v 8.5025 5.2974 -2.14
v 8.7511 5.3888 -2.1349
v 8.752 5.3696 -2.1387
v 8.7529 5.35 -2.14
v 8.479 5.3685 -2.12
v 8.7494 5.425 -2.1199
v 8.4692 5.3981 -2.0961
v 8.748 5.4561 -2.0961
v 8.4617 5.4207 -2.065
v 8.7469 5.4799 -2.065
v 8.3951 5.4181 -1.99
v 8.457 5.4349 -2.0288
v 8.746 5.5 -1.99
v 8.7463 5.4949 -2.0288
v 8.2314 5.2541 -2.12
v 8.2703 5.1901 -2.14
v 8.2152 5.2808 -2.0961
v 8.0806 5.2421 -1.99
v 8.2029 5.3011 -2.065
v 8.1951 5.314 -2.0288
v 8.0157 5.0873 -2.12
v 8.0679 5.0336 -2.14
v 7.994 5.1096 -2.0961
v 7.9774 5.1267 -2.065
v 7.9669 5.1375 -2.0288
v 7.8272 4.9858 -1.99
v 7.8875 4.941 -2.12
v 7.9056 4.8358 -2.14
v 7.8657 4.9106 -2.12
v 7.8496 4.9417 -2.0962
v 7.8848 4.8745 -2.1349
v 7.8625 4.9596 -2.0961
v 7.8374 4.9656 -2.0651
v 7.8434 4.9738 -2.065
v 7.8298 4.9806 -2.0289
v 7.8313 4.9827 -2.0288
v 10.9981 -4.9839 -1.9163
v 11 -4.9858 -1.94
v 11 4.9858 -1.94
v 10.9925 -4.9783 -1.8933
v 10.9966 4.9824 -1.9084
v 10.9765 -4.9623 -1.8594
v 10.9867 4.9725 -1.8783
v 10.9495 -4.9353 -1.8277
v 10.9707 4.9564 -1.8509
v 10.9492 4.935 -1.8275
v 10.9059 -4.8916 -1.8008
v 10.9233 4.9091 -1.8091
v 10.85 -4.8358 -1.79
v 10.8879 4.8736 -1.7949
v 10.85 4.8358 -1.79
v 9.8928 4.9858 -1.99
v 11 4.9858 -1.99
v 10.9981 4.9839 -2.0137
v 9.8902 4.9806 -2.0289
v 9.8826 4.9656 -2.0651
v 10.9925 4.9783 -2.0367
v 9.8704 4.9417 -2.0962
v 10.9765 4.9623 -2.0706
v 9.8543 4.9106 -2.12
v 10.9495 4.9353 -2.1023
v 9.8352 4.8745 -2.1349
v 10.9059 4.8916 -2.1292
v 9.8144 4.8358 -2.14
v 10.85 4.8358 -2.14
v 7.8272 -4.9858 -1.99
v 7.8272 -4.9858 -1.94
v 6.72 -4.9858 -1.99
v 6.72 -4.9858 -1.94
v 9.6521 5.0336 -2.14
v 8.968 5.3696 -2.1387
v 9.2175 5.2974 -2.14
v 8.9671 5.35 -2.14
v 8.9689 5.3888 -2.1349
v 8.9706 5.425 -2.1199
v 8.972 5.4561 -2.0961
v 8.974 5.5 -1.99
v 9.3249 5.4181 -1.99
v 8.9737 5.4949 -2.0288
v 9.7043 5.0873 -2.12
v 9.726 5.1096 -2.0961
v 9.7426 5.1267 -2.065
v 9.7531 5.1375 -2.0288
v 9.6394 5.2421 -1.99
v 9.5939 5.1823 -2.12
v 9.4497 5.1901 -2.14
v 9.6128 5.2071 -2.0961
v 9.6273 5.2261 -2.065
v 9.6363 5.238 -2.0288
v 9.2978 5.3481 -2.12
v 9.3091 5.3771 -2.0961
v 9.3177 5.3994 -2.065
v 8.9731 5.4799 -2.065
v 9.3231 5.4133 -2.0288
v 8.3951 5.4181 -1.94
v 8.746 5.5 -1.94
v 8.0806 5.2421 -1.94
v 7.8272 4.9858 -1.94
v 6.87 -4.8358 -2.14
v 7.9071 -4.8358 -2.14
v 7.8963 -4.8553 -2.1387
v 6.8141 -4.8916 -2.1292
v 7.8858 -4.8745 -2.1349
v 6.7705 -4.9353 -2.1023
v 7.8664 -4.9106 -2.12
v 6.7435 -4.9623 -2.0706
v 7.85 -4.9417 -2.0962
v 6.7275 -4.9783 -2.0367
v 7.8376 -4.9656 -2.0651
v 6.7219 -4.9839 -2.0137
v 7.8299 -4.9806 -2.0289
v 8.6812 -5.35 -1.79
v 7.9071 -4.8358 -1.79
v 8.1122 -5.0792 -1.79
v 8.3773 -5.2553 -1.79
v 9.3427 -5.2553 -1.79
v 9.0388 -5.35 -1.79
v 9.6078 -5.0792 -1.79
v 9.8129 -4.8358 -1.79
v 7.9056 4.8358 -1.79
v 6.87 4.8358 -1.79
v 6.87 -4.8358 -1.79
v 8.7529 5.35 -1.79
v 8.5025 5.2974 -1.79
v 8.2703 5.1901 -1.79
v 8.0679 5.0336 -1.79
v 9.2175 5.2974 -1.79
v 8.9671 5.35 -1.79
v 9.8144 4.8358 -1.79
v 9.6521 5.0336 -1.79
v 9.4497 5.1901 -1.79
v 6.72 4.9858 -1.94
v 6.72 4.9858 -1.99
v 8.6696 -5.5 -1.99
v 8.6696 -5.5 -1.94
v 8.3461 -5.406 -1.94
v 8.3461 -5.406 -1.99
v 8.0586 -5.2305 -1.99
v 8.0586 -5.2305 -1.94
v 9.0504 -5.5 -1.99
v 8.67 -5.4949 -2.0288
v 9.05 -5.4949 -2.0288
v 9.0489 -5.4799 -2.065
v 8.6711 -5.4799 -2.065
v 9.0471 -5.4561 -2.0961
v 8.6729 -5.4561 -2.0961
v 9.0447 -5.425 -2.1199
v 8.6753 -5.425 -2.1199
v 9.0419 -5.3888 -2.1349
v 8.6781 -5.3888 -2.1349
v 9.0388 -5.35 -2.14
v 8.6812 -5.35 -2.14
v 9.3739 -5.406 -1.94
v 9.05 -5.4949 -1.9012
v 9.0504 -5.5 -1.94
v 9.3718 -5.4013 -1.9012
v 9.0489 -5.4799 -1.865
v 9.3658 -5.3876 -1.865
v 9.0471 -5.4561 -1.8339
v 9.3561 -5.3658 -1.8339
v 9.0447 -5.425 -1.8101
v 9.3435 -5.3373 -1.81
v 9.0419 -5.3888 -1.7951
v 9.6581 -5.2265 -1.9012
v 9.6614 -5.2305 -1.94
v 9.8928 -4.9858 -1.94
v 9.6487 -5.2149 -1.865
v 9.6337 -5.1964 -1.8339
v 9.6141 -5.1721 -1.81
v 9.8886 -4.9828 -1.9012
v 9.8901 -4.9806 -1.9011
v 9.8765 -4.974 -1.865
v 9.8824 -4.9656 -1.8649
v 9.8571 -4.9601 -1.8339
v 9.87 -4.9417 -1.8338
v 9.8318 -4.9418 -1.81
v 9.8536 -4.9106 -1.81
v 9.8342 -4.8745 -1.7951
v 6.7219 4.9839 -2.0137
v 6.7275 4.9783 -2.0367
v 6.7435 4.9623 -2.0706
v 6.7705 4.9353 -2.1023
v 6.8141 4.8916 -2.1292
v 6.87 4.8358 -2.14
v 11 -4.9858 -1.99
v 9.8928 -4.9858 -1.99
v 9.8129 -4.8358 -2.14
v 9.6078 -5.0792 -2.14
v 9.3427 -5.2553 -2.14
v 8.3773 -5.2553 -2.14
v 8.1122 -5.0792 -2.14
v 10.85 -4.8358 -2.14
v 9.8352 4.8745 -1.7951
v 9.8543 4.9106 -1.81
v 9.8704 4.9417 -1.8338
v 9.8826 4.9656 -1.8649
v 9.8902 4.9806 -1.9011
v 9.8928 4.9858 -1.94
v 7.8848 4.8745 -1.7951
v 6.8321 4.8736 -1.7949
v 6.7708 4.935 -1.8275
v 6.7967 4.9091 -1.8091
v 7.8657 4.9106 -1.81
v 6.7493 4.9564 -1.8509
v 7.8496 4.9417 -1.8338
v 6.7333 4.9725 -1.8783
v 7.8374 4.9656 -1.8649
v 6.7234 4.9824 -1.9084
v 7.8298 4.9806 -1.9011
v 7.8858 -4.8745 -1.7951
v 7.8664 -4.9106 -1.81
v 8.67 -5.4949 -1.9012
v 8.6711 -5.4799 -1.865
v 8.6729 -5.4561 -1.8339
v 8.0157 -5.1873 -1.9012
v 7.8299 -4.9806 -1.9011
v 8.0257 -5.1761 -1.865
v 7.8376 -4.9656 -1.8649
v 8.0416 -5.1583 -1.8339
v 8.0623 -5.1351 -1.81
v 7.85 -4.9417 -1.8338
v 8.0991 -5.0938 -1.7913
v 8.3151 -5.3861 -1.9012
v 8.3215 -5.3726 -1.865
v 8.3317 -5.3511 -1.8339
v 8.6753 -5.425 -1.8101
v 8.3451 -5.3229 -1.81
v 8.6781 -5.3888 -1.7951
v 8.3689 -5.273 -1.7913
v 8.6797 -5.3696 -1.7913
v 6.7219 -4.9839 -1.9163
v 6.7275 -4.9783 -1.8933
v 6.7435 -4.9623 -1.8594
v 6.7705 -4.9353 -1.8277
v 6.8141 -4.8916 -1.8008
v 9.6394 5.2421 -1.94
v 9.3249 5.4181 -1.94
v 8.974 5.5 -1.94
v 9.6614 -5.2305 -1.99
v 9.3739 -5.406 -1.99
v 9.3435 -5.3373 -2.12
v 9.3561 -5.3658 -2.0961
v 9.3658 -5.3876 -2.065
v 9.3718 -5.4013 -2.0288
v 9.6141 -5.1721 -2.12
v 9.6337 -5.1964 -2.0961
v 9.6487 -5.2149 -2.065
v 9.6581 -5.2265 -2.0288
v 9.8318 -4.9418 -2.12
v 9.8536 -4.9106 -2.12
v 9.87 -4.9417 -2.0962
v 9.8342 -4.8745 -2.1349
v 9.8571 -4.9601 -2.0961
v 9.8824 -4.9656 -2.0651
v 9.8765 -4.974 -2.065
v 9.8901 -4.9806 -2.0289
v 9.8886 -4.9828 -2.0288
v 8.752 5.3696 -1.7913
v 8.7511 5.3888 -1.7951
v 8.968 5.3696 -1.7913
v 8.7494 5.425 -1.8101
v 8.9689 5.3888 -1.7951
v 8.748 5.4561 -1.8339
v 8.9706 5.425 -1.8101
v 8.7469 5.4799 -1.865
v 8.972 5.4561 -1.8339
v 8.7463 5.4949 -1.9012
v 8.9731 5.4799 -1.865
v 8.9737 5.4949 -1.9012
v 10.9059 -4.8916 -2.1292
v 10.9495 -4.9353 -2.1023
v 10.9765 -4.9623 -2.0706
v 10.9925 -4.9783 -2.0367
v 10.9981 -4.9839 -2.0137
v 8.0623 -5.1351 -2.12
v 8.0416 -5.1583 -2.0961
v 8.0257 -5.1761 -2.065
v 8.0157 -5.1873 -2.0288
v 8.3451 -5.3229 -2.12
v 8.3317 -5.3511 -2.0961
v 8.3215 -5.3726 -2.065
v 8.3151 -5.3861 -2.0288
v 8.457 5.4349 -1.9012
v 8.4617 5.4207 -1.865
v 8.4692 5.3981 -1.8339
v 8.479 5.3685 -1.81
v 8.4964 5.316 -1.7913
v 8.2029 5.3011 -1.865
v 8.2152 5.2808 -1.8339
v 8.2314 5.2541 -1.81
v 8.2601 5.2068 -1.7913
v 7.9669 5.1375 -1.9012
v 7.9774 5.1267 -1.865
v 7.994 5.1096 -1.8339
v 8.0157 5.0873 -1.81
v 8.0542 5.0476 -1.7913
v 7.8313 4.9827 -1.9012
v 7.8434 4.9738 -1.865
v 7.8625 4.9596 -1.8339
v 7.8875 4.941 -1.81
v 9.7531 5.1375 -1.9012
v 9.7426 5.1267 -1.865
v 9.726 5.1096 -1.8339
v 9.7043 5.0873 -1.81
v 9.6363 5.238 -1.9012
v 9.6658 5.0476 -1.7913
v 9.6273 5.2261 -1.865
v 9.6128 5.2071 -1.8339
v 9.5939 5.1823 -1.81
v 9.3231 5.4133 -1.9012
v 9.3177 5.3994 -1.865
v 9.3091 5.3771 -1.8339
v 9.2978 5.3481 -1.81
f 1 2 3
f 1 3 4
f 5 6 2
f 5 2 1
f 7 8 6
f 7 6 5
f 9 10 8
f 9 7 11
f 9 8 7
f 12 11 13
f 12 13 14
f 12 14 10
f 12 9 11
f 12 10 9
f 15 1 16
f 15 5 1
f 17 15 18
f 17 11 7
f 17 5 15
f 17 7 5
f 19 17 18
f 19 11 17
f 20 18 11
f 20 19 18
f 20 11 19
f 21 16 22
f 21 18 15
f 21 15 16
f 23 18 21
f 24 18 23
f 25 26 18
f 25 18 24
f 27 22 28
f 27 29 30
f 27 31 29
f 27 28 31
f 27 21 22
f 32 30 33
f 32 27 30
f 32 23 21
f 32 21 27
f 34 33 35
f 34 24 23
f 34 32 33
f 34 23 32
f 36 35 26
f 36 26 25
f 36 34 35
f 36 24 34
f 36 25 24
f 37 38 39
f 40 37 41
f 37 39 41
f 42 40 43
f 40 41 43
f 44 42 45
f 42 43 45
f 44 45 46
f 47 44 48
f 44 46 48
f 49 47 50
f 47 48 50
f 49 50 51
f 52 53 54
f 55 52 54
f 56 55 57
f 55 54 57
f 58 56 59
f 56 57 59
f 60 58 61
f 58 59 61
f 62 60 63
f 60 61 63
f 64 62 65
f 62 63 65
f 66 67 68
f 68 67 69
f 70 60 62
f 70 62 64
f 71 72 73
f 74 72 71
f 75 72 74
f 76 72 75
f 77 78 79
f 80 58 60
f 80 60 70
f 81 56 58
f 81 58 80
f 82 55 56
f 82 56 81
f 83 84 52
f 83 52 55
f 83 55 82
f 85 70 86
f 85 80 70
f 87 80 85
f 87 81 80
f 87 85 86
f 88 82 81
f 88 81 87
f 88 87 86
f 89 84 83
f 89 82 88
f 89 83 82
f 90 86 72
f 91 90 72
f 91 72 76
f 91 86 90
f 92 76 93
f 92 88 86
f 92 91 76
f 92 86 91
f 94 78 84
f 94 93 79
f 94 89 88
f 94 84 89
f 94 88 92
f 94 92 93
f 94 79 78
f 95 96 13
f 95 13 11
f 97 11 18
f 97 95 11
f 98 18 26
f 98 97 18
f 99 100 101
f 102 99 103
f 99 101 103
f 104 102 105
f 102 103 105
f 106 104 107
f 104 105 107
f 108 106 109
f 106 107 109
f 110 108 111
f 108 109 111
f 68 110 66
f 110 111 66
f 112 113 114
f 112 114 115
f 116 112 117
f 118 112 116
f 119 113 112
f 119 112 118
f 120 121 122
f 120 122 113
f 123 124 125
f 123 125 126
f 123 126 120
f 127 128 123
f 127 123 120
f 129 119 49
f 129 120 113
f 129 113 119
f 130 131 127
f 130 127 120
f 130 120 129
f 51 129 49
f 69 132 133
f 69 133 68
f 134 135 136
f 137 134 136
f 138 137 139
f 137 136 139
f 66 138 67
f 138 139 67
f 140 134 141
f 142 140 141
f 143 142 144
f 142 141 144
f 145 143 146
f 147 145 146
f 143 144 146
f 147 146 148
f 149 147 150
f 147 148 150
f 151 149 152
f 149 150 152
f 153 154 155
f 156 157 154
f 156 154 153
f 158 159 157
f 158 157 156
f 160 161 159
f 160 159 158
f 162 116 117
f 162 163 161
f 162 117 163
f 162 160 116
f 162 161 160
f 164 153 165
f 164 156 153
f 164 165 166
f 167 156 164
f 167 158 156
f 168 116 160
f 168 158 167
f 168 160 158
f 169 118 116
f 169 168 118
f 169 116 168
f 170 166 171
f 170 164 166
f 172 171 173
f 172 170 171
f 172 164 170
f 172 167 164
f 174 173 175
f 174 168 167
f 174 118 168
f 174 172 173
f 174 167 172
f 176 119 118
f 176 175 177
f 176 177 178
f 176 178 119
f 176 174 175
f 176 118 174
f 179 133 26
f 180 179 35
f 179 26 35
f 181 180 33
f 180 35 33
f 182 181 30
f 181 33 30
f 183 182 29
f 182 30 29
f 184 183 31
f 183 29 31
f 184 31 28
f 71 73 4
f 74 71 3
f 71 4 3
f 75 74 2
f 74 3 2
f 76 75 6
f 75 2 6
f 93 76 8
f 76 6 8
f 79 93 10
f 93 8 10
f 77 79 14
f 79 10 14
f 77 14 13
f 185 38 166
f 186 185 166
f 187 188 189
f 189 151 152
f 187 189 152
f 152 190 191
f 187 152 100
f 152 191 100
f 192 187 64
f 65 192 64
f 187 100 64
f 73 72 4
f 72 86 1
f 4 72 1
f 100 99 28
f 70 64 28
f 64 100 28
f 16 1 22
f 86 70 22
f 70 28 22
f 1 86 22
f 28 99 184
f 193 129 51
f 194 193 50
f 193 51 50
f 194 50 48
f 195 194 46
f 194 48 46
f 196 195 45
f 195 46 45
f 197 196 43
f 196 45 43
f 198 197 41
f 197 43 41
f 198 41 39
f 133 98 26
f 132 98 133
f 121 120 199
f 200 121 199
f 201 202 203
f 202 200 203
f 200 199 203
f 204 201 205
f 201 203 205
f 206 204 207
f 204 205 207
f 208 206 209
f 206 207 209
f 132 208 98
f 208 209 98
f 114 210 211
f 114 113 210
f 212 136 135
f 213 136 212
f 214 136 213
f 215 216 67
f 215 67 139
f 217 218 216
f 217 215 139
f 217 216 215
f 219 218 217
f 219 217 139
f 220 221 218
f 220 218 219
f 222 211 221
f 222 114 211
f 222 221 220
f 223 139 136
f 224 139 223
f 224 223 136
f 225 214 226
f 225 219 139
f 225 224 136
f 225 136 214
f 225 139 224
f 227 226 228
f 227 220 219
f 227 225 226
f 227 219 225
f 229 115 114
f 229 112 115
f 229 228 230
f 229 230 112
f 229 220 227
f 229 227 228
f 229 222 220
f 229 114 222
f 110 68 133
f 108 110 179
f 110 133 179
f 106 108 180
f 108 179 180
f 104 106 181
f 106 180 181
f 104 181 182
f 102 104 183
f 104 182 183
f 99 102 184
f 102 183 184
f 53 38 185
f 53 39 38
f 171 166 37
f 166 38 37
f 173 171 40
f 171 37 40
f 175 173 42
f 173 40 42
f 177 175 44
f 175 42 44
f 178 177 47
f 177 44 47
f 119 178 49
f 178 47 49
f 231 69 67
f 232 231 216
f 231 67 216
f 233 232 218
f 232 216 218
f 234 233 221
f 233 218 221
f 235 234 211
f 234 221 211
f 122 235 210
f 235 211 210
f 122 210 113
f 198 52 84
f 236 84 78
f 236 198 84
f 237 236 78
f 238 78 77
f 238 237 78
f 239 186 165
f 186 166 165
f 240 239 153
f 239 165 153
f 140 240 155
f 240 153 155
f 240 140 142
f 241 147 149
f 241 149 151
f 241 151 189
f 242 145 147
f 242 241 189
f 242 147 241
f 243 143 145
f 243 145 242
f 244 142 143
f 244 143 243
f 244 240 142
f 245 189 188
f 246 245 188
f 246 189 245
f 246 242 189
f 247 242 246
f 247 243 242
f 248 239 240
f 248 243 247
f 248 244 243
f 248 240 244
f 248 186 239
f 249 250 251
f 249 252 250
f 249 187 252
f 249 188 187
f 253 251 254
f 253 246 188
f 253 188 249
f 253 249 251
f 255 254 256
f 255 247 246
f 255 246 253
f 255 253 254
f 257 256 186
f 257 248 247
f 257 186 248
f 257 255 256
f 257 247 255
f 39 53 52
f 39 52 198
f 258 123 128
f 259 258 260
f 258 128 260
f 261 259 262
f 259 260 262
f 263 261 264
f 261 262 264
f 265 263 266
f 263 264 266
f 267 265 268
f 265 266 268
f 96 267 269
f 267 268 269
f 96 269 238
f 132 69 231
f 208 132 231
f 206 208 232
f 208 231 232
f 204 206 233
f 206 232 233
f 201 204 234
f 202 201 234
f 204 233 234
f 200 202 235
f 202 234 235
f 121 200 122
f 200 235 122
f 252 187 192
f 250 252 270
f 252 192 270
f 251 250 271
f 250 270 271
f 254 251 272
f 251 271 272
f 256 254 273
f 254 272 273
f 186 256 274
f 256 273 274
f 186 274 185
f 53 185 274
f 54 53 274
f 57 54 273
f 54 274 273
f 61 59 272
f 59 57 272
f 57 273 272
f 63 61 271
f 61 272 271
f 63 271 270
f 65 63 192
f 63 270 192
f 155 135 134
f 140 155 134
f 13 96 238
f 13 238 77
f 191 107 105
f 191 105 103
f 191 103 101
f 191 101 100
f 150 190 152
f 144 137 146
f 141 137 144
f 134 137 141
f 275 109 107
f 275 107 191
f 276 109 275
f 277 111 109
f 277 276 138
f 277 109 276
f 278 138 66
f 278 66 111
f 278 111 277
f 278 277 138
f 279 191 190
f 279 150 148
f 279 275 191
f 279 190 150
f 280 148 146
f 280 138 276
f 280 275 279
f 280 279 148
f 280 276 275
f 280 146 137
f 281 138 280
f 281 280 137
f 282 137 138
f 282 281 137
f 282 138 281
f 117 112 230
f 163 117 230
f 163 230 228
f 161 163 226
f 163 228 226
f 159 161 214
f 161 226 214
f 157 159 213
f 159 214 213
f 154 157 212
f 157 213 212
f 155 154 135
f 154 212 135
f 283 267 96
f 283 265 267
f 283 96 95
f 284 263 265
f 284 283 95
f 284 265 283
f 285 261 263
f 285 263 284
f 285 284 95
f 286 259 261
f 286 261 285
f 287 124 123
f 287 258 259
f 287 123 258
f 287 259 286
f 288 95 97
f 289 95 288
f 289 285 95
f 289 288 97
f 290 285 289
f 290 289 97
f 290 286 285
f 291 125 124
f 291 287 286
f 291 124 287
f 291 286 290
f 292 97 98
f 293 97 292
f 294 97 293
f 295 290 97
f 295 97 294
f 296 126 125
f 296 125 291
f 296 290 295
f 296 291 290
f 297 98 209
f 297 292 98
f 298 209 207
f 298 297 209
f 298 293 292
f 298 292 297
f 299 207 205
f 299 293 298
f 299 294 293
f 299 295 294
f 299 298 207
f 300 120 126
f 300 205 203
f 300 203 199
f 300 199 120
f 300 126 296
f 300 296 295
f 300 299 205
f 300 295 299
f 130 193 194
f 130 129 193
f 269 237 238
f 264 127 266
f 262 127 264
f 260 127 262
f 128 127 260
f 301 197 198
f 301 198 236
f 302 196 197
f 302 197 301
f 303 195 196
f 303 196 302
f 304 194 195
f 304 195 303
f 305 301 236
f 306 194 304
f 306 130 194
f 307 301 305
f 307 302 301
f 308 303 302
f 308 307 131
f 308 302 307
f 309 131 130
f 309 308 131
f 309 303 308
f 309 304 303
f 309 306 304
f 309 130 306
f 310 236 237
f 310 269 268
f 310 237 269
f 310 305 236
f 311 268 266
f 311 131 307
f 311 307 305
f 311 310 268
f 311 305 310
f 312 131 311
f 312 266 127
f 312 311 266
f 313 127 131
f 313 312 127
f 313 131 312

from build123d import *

# Parameters (mm, degrees)
ESBO_O1_W                  = 4.28
ESBO_O1_H                  = 11
RESSALTO_EXTRUS_O1_DEPTH   = 11
CORTE_EXTRUS_O1_DEPTH      = 14
CORTE_EXTRUS_O1_DEPTH_BACK = 8.18
CORTE_EXTRUS_O3_DEPTH      = 13
CORTE_EXTRUS_O3_DEPTH_BACK = 12.18
CORTE_EXTRUS_O5_DEPTH      = 7.18
CORTE_EXTRUS_O5_DEPTH_BACK = 13
FILETE2_R                  = 0.15


with BuildPart() as part:
    # Esboço1 → Ressalto-extrusão1 (new body)
    with BuildSketch(Plane(origin=(0, 0, 0), x_dir=(0, 0, -1), z_dir=(1, 0, 0))):
        Rectangle(ESBO_O1_W, ESBO_O1_H)
    extrude(amount=RESSALTO_EXTRUS_O1_DEPTH)

    # Esboço4 → Corte-extrusão1 (cut, two sides: drawn at the far end of the back side and taken through both)
    with BuildSketch(Plane(origin=(0, 0, -2.14), x_dir=(-1, 0, 0), z_dir=(0, 0, -1)).offset(-CORTE_EXTRUS_O1_DEPTH_BACK)):
        Polygon((-6.72, 5.5), (-6.72, -5.5), (-6.72, -6.924664603), (2.265516733, -6.924664603), (2.265516733, 6.311337166), (-6.479345422, 6.786171311), align=None)
    extrude(amount=CORTE_EXTRUS_O1_DEPTH + CORTE_EXTRUS_O1_DEPTH_BACK, mode=Mode.SUBTRACT)

    # Esboço5 → Corte-extrusão3 (cut, two sides: drawn at the far end of the back side and taken through both)
    with BuildSketch(Plane.XZ.offset(5.5).offset(-CORTE_EXTRUS_O3_DEPTH_BACK)):
        Polygon((6.019412649, -1.79), (11.617448209, -1.79), (11.996193189, 3.076148253), (6.185690933, 3.076148253), (6.019412649, -1.376414684), (6.019412649, -1.487266873), align=None)
    extrude(amount=CORTE_EXTRUS_O3_DEPTH + CORTE_EXTRUS_O3_DEPTH_BACK, mode=Mode.SUBTRACT)

    # Esboço6 → Corte-extrusão5 (cut, two sides: drawn at the far end of the back side and taken through both)
    with BuildSketch(Plane(origin=(0, 0, -2.14), x_dir=(-1, 0, 0), z_dir=(0, 0, -1)).offset(-CORTE_EXTRUS_O5_DEPTH_BACK)):
        with BuildLine():
            Line((-7.827235736, 4.985758514), (-6.355249889, 4.985758514))
            Line((-6.355249889, 4.985758514), (-5.940072912, 7.451017437))
            Line((-5.940072912, 7.451017437), (-11.125738277, 7.451017437))
            Line((-11.125738277, 7.451017437), (-11.364750111, 4.985758514))
            Line((-11.364750111, 4.985758514), (-9.892764264, 4.985758514))
            ThreePointArc((-9.892764264, 4.985758514), (-8.86, 5.50505659), (-7.827235736, 4.985758514))
        make_face()
        with BuildLine():
            Line((-7.827235736, -4.985758514), (-6.355249889, -4.985758514))
            Line((-6.355249889, -4.985758514), (-6.545759622, -6.950748332))
            Line((-6.545759622, -6.950748332), (-10.182890029, -6.950748332))
            Line((-10.182890029, -6.950748332), (-13.175715932, -6.660587814))
            Line((-13.175715932, -6.660587814), (-11.364750111, -4.985758514))
            Line((-11.364750111, -4.985758514), (-9.892764264, -4.985758514))
            ThreePointArc((-9.892764264, -4.985758514), (-8.86, -5.514320063), (-7.827235736, -4.985758514))
        make_face()
    extrude(amount=CORTE_EXTRUS_O5_DEPTH + CORTE_EXTRUS_O5_DEPTH_BACK, mode=Mode.SUBTRACT)

    # Filete2
    # the kernel refuses this fillet: 0.15 mm, written as the material it takes off along each edge
    with BuildSketch(Plane(origin=(9.34895697, 5.5, -1.79), x_dir=(0, -1, 0), z_dir=(-1, 0, 0)), Plane(origin=(8.37104303, 5.5, -2.14), x_dir=(0, -1, 0), z_dir=(1, 0, 0))) as filete2_piece_1:
        with BuildLine():
            CenterArc((FILETE2_R, -FILETE2_R), FILETE2_R, 90, 90)
            Line((0, -FILETE2_R), (0, 0))
            Line((0, 0), (FILETE2_R, 0))
        make_face()
    extrude(amount=0.977913941, mode=Mode.SUBTRACT)
    with BuildSketch(Plane(origin=(11.375, 4.985758514, -1.79), x_dir=(0, -1, 0), z_dir=(-1, 0, 0))) as filete2_piece_2_section:
        with BuildLine():
            CenterArc((FILETE2_R, -FILETE2_R), FILETE2_R, 90, 90)
            Line((0, -FILETE2_R), (0, 0))
            Line((0, 0), (FILETE2_R, 0))
        make_face()
    filete2_piece_2 = extrude(amount=1.857235736, mode=Mode.PRIVATE)
    filete2_piece_2 = filete2_piece_2 - Plane(origin=(8.86, 4.21844243, -1.824247576), x_dir=(0.8026992826896523, 0.5963839883577674, 0), z_dir=(0, 0, 1)) * Cylinder(1.28661416, 5, mode=Mode.PRIVATE)
    add(filete2_piece_2, mode=Mode.SUBTRACT)
    with BuildSketch(Plane(origin=(8.86, 4.21844243, -1.79), x_dir=(0.940229636725142, 0.34054108448718423, 0), z_dir=(0.34054108448718423, -0.940229636725142, 0))) as filete2_piece_3_section:
        with BuildLine():
            CenterArc((1.28661416 - FILETE2_R, -FILETE2_R), FILETE2_R, 0, 90)
            Line((1.28661416, -FILETE2_R), (1.28661416, 0))
            Line((1.28661416, 0), (1.28661416 - FILETE2_R, 0))
        make_face()
    filete2_piece_3 = revolve(axis=Axis((8.86, 4.21844243, -1.79), (0, 0, 1)), revolution_arc=81.710254876, mode=Mode.PRIVATE)
    filete2_piece_3 = split(filete2_piece_3, bisect_by=Plane(origin=(9.30349686, 4.985758514, -1.832519321), z_dir=(0, 1, 0)), keep=Keep.TOP, mode=Mode.PRIVATE)
    add(filete2_piece_3, mode=Mode.SUBTRACT)
    with BuildSketch(Plane(origin=(8.86, 4.21844243, -1.79), x_dir=(0.20142152320806478, 0.9795046554195355, 0), z_dir=(0.9795046554195355, -0.20142152320806478, 0))) as filete2_piece_4_section:
        with BuildLine():
            CenterArc((1.28661416 - FILETE2_R, -FILETE2_R), FILETE2_R, 0, 90)
            Line((1.28661416, -FILETE2_R), (1.28661416, 0))
            Line((1.28661416, 0), (1.28661416 - FILETE2_R, 0))
        make_face()
    filete2_piece_4 = revolve(axis=Axis((8.86, 4.21844243, -1.79), (0, 0, 1)), revolution_arc=81.710254876, mode=Mode.PRIVATE)
    filete2_piece_4 = split(filete2_piece_4, bisect_by=Plane(origin=(8.416503141, 4.985758514, -1.832519323), z_dir=(0, 1, 0)), keep=Keep.TOP, mode=Mode.PRIVATE)
    add(filete2_piece_4, mode=Mode.SUBTRACT)
    with BuildSketch(Plane(origin=(8.202235736, 4.985758514, -1.79), x_dir=(0, -1, 0), z_dir=(-1, 0, 0))) as filete2_piece_5_section:
        with BuildLine():
            CenterArc((FILETE2_R, -FILETE2_R), FILETE2_R, 90, 90)
            Line((0, -FILETE2_R), (0, 0))
            Line((0, 0), (FILETE2_R, 0))
        make_face()
    filete2_piece_5 = extrude(amount=1.857235736, mode=Mode.PRIVATE)
    filete2_piece_5 = filete2_piece_5 - Plane(origin=(8.86, 4.21844243, -1.824247576), x_dir=(0.8026992826896523, 0.5963839883577674, 0), z_dir=(0, 0, 1)) * Cylinder(1.28661416, 5, mode=Mode.PRIVATE)
    add(filete2_piece_5, mode=Mode.SUBTRACT)
    with BuildSketch(Plane(origin=(6.72, 5.360758514, -2.14), x_dir=(1, 0, 0), z_dir=(0, -1, 0)), Plane(origin=(6.72, -5.360758514, -1.79), x_dir=(1, 0, 0), z_dir=(0, 1, 0)), Plane(origin=(11, 5.360758514, -1.79), x_dir=(-1, 0, 0), z_dir=(0, -1, 0)), Plane(origin=(11, -5.360758514, -2.14), x_dir=(-1, 0, 0), z_dir=(0, 1, 0))) as filete2_piece_6:
        with BuildLine():
            CenterArc((FILETE2_R, FILETE2_R), FILETE2_R, 180, 90)
            Line((0, FILETE2_R), (0, 0))
            Line((0, 0), (FILETE2_R, 0))
        make_face()
    extrude(amount=10.721517028, mode=Mode.SUBTRACT)
    with BuildSketch(Plane(origin=(8.202235736, 4.985758514, -2.14), x_dir=(0, -1, 0), z_dir=(-1, 0, 0))) as filete2_piece_7_section:
        with BuildLine():
            CenterArc((FILETE2_R, FILETE2_R), FILETE2_R, 180, 90)
            Line((0, FILETE2_R), (0, 0))
            Line((0, 0), (FILETE2_R, 0))
        make_face()
    filete2_piece_7 = extrude(amount=1.857235736, mode=Mode.PRIVATE)
    filete2_piece_7 = filete2_piece_7 - Plane(origin=(8.86, 4.21844243, -2.105752424), x_dir=(0.8026992826896523, 0.5963839883577674, 0), z_dir=(0, 0, 1)) * Cylinder(1.28661416, 5, mode=Mode.PRIVATE)
    add(filete2_piece_7, mode=Mode.SUBTRACT)
    with BuildSketch(Plane(origin=(8.86, 4.21844243, -2.14), x_dir=(0.20142152320806478, 0.9795046554195355, 0), z_dir=(0.9795046554195355, -0.20142152320806478, 0))) as filete2_piece_8_section:
        with BuildLine():
            CenterArc((1.28661416 - FILETE2_R, FILETE2_R), FILETE2_R, 270, 90)
            Line((1.28661416, FILETE2_R), (1.28661416, 0))
            Line((1.28661416, 0), (1.28661416 - FILETE2_R, 0))
        make_face()
    filete2_piece_8 = revolve(axis=Axis((8.86, 4.21844243, -2.14), (0, 0, 1)), revolution_arc=81.710254876, mode=Mode.PRIVATE)
    filete2_piece_8 = split(filete2_piece_8, bisect_by=Plane(origin=(8.416503141, 4.985758514, -2.097480677), z_dir=(0, 1, 0)), keep=Keep.TOP, mode=Mode.PRIVATE)
    add(filete2_piece_8, mode=Mode.SUBTRACT)
    with BuildSketch(Plane(origin=(8.86, 4.21844243, -2.14), x_dir=(0.940229636725142, 0.34054108448718423, 0), z_dir=(0.34054108448718423, -0.940229636725142, 0))) as filete2_piece_9_section:
        with BuildLine():
            CenterArc((1.28661416 - FILETE2_R, FILETE2_R), FILETE2_R, 270, 90)
            Line((1.28661416, FILETE2_R), (1.28661416, 0))
            Line((1.28661416, 0), (1.28661416 - FILETE2_R, 0))
        make_face()
    filete2_piece_9 = revolve(axis=Axis((8.86, 4.21844243, -2.14), (0, 0, 1)), revolution_arc=81.710254876, mode=Mode.PRIVATE)
    filete2_piece_9 = split(filete2_piece_9, bisect_by=Plane(origin=(9.30349686, 4.985758514, -2.097480679), z_dir=(0, 1, 0)), keep=Keep.TOP, mode=Mode.PRIVATE)
    add(filete2_piece_9, mode=Mode.SUBTRACT)
    with BuildSketch(Plane(origin=(11.375, 4.985758514, -2.14), x_dir=(0, -1, 0), z_dir=(-1, 0, 0))) as filete2_piece_10_section:
        with BuildLine():
            CenterArc((FILETE2_R, FILETE2_R), FILETE2_R, 180, 90)
            Line((0, FILETE2_R), (0, 0))
            Line((0, 0), (FILETE2_R, 0))
        make_face()
    filete2_piece_10 = extrude(amount=1.857235736, mode=Mode.PRIVATE)
    filete2_piece_10 = filete2_piece_10 - Plane(origin=(8.86, 4.21844243, -2.105752424), x_dir=(0.8026992826896523, 0.5963839883577674, 0), z_dir=(0, 0, 1)) * Cylinder(1.28661416, 5, mode=Mode.PRIVATE)
    add(filete2_piece_10, mode=Mode.SUBTRACT)
    with BuildSketch(Plane(origin=(8.294577036, -5.5, -1.79), x_dir=(0, 0, -1), z_dir=(1, 0, 0))) as filete2_piece_11:
        with BuildLine():
            CenterArc((FILETE2_R, FILETE2_R), FILETE2_R, 180, 90)
            Line((0, FILETE2_R), (0, 0))
            Line((0, 0), (FILETE2_R, 0))
        make_face()
    extrude(amount=1.130845928, mode=Mode.SUBTRACT)
    with BuildSketch(Plane(origin=(8.202235736, -4.985758514, -1.79), x_dir=(0, 1, 0), z_dir=(-1, 0, 0))) as filete2_piece_12_section:
        with BuildLine():
            CenterArc((FILETE2_R, FILETE2_R), FILETE2_R, 180, 90)
            Line((0, FILETE2_R), (0, 0))
            Line((0, 0), (FILETE2_R, 0))
        make_face()
    filete2_piece_12 = extrude(amount=1.857235736, mode=Mode.PRIVATE)
    filete2_piece_12 = filete2_piece_12 - Plane(origin=(8.86, -4.24107257, -1.824238656), x_dir=(0.8111260921200049, -0.5848713214734753, 0), z_dir=(0, 0, 1)) * Cylinder(1.273247493, 5, mode=Mode.PRIVATE)
    add(filete2_piece_12, mode=Mode.SUBTRACT)
    with BuildSketch(Plane(origin=(8.86, -4.24107257, -1.79), x_dir=(-0.9459877087145345, -0.324202490676776, 0), z_dir=(-0.324202490676776, 0.9459877087145345, 0))) as filete2_piece_13_section:
        with BuildLine():
            CenterArc((1.273247493 - FILETE2_R, -FILETE2_R), FILETE2_R, 0, 90)
            Line((1.273247493, -FILETE2_R), (1.273247493, 0))
            Line((1.273247493, 0), (1.273247493 - FILETE2_R, 0))
        make_face()
    filete2_piece_13 = revolve(axis=Axis((8.86, -4.24107257, -1.79), (0, 0, 1)), revolution_arc=79.358119844, mode=Mode.PRIVATE)
    filete2_piece_13 = split(filete2_piece_13, bisect_by=Plane(origin=(8.379810513, -4.985758514, -1.832543049), z_dir=(0, -1, 0)), keep=Keep.TOP, mode=Mode.PRIVATE)
    add(filete2_piece_13, mode=Mode.SUBTRACT)
    with BuildSketch(Plane(origin=(8.86, -4.24107257, -1.79), x_dir=(-0.14393107441873307, -0.9895877150695988, 0), z_dir=(-0.9895877150695988, 0.14393107441873307, 0))) as filete2_piece_14_section:
        with BuildLine():
            CenterArc((1.273247493 - FILETE2_R, -FILETE2_R), FILETE2_R, 0, 90)
            Line((1.273247493 - FILETE2_R, 0), (1.273247493, 0))
            Line((1.273247493, 0), (1.273247493, -FILETE2_R))
        make_face()
    filete2_piece_14 = revolve(axis=Axis((8.86, -4.24107257, -1.79), (0, 0, 1)), revolution_arc=79.358119844, mode=Mode.PRIVATE)
    filete2_piece_14 = split(filete2_piece_14, bisect_by=Plane(origin=(9.340189487, -4.985758514, -1.83254305), z_dir=(0, -1, 0)), keep=Keep.TOP, mode=Mode.PRIVATE)
    add(filete2_piece_14, mode=Mode.SUBTRACT)
    with BuildSketch(Plane(origin=(11.375, -4.985758514, -1.79), x_dir=(0, 1, 0), z_dir=(-1, 0, 0))) as filete2_piece_15_section:
        with BuildLine():
            CenterArc((FILETE2_R, FILETE2_R), FILETE2_R, 180, 90)
            Line((0, FILETE2_R), (0, 0))
            Line((0, 0), (FILETE2_R, 0))
        make_face()
    filete2_piece_15 = extrude(amount=1.857235736, mode=Mode.PRIVATE)
    filete2_piece_15 = filete2_piece_15 - Plane(origin=(8.86, -4.24107257, -1.824238656), x_dir=(0.8111260921200049, -0.5848713214734753, 0), z_dir=(0, 0, 1)) * Cylinder(1.273247493, 5, mode=Mode.PRIVATE)
    add(filete2_piece_15, mode=Mode.SUBTRACT)
    with BuildSketch(Plane(origin=(8.294577036, -5.5, -2.14), x_dir=(0, 0, 1), z_dir=(1, 0, 0))) as filete2_piece_16:
        with BuildLine():
            CenterArc((FILETE2_R, -FILETE2_R), FILETE2_R, 90, 90)
            Line((0, -FILETE2_R), (0, 0))
            Line((0, 0), (FILETE2_R, 0))
        make_face()
    extrude(amount=1.130845928, mode=Mode.SUBTRACT)
    with BuildSketch(Plane(origin=(11.375, -4.985758514, -2.14), x_dir=(0, 1, 0), z_dir=(-1, 0, 0))) as filete2_piece_17_section:
        with BuildLine():
            CenterArc((FILETE2_R, -FILETE2_R), FILETE2_R, 90, 90)
            Line((0, -FILETE2_R), (0, 0))
            Line((0, 0), (FILETE2_R, 0))
        make_face()
    filete2_piece_17 = extrude(amount=1.857235736, mode=Mode.PRIVATE)
    filete2_piece_17 = filete2_piece_17 - Plane(origin=(8.86, -4.24107257, -2.105761344), x_dir=(0.8111260921200049, -0.5848713214734753, 0), z_dir=(0, 0, 1)) * Cylinder(1.273247493, 5, mode=Mode.PRIVATE)
    add(filete2_piece_17, mode=Mode.SUBTRACT)
    with BuildSketch(Plane(origin=(8.86, -4.24107257, -2.14), x_dir=(-0.14393107441877348, -0.9895877150695928, 0), z_dir=(-0.9895877150695928, 0.14393107441877348, 0))) as filete2_piece_18_section:
        with BuildLine():
            CenterArc((1.273247493 - FILETE2_R, FILETE2_R), FILETE2_R, 270, 90)
            Line((1.273247493, FILETE2_R), (1.273247493, 0))
            Line((1.273247493, 0), (1.273247493 - FILETE2_R, 0))
        make_face()
    filete2_piece_18 = revolve(axis=Axis((8.86, -4.24107257, -2.14), (0, 0, 1)), revolution_arc=79.358119844, mode=Mode.PRIVATE)
    filete2_piece_18 = split(filete2_piece_18, bisect_by=Plane(origin=(9.340189487, -4.985758514, -2.09745695), z_dir=(0, -1, 0)), keep=Keep.TOP, mode=Mode.PRIVATE)
    add(filete2_piece_18, mode=Mode.SUBTRACT)
    with BuildSketch(Plane(origin=(8.86, -4.24107257, -2.14), x_dir=(-0.9459877087145341, -0.3242024906767768, 0), z_dir=(-0.3242024906767768, 0.9459877087145341, 0))) as filete2_piece_19_section:
        with BuildLine():
            CenterArc((1.273247493 - FILETE2_R, FILETE2_R), FILETE2_R, 270, 90)
            Line((1.273247493, FILETE2_R), (1.273247493, 0))
            Line((1.273247493, 0), (1.273247493 - FILETE2_R, 0))
        make_face()
    filete2_piece_19 = revolve(axis=Axis((8.86, -4.24107257, -2.14), (0, 0, 1)), revolution_arc=79.358119844, mode=Mode.PRIVATE)
    filete2_piece_19 = split(filete2_piece_19, bisect_by=Plane(origin=(8.379810513, -4.985758514, -2.097456951), z_dir=(0, -1, 0)), keep=Keep.TOP, mode=Mode.PRIVATE)
    add(filete2_piece_19, mode=Mode.SUBTRACT)
    with BuildSketch(Plane(origin=(8.202235736, -4.985758514, -2.14), x_dir=(0, 1, 0), z_dir=(-1, 0, 0))) as filete2_piece_20_section:
        with BuildLine():
            CenterArc((FILETE2_R, -FILETE2_R), FILETE2_R, 90, 90)
            Line((0, -FILETE2_R), (0, 0))
            Line((0, 0), (FILETE2_R, 0))
        make_face()
    filete2_piece_20 = extrude(amount=1.857235736, mode=Mode.PRIVATE)
    filete2_piece_20 = filete2_piece_20 - Plane(origin=(8.86, -4.24107257, -2.105761344), x_dir=(0.8111260921200049, -0.5848713214734753, 0), z_dir=(0, 0, 1)) * Cylinder(1.273247493, 5, mode=Mode.PRIVATE)
    add(filete2_piece_20, mode=Mode.SUBTRACT)
    with BuildSketch(Plane(origin=(8.86, 4.21844243, -1.79), x_dir=(0.940229636725142, 0.34054108448718423, 0), z_dir=(0.34054108448718423, -0.940229636725142, 0))) as filete2_piece_21a_section:
        with BuildLine():
            CenterArc((1.28661416 - FILETE2_R, -FILETE2_R), FILETE2_R, 0, 90)
            Line((1.28661416, -FILETE2_R), (1.28661416, 0))
            Line((1.28661416, 0), (1.28661416 - FILETE2_R, 0))
        make_face()
    filete2_piece_21a = revolve(axis=Axis((8.86, 4.21844243, -1.79), (0, 0, 1)), revolution_arc=81.710254876, mode=Mode.PRIVATE)
    filete2_piece_21a = split(filete2_piece_21a, bisect_by=Plane(origin=(9.951335845, 4.985758514, -1.823219459), z_dir=(0, -1, 0)), keep=Keep.TOP, mode=Mode.PRIVATE)
    with BuildSketch(Plane(origin=(11.375, 4.985758514, -1.79), x_dir=(0, -1, 0), z_dir=(-1, 0, 0))) as filete2_piece_21b_section:
        with BuildLine():
            CenterArc((FILETE2_R, -FILETE2_R), FILETE2_R, 90, 90)
            Line((0, -FILETE2_R), (0, 0))
            Line((0, 0), (FILETE2_R, 0))
        make_face()
    filete2_piece_21b = extrude(amount=1.857235736, mode=Mode.PRIVATE)
    filete2_piece_21b = filete2_piece_21b & Plane(origin=(8.86, 4.21844243, -1.822904463), x_dir=(0.8026992826896523, 0.5963839883577674, 0), z_dir=(0, 0, 1)) * Cylinder(1.28661416, 5, mode=Mode.PRIVATE)
    filete2_piece_21 = filete2_piece_21a & filete2_piece_21b
    add(filete2_piece_21, mode=Mode.SUBTRACT)
    with BuildSketch(Plane(origin=(8.202235736, 4.985758514, -1.79), x_dir=(0, -1, 0), z_dir=(-1, 0, 0))) as filete2_piece_22a_section:
        with BuildLine():
            CenterArc((FILETE2_R, -FILETE2_R), FILETE2_R, 90, 90)
            Line((0, -FILETE2_R), (0, 0))
            Line((0, 0), (FILETE2_R, 0))
        make_face()
    filete2_piece_22a = extrude(amount=1.857235736, mode=Mode.PRIVATE)
    filete2_piece_22a = filete2_piece_22a & Plane(origin=(8.86, 4.21844243, -1.822904463), x_dir=(0.8026992826896523, 0.5963839883577674, 0), z_dir=(0, 0, 1)) * Cylinder(1.28661416, 5, mode=Mode.PRIVATE)
    with BuildSketch(Plane(origin=(8.86, 4.21844243, -1.79), x_dir=(0.20142152320806478, 0.9795046554195355, 0), z_dir=(0.9795046554195355, -0.20142152320806478, 0))) as filete2_piece_22b_section:
        with BuildLine():
            CenterArc((1.28661416 - FILETE2_R, -FILETE2_R), FILETE2_R, 0, 90)
            Line((1.28661416, -FILETE2_R), (1.28661416, 0))
            Line((1.28661416, 0), (1.28661416 - FILETE2_R, 0))
        make_face()
    filete2_piece_22b = revolve(axis=Axis((8.86, 4.21844243, -1.79), (0, 0, 1)), revolution_arc=81.710254876, mode=Mode.PRIVATE)
    filete2_piece_22b = split(filete2_piece_22b, bisect_by=Plane(origin=(7.768663503, 4.985758514, -1.823219564), z_dir=(0, -1, 0)), keep=Keep.TOP, mode=Mode.PRIVATE)
    filete2_piece_22 = filete2_piece_22a & filete2_piece_22b
    add(filete2_piece_22, mode=Mode.SUBTRACT)
    with BuildSketch(Plane(origin=(8.202235736, 4.985758514, -2.14), x_dir=(0, -1, 0), z_dir=(-1, 0, 0))) as filete2_piece_23a_section:
        with BuildLine():
            CenterArc((FILETE2_R, FILETE2_R), FILETE2_R, 180, 90)
            Line((0, FILETE2_R), (0, 0))
            Line((0, 0), (FILETE2_R, 0))
        make_face()
    filete2_piece_23a = extrude(amount=1.857235736, mode=Mode.PRIVATE)
    filete2_piece_23a = filete2_piece_23a & Plane(origin=(8.86, 4.21844243, -2.107095537), x_dir=(0.8026992826896523, 0.5963839883577674, 0), z_dir=(0, 0, 1)) * Cylinder(1.28661416, 5, mode=Mode.PRIVATE)
    with BuildSketch(Plane(origin=(8.86, 4.21844243, -2.14), x_dir=(0.20142152320806478, 0.9795046554195355, 0), z_dir=(0.9795046554195355, -0.20142152320806478, 0))) as filete2_piece_23b_section:
        with BuildLine():
            CenterArc((1.28661416 - FILETE2_R, FILETE2_R), FILETE2_R, 270, 90)
            Line((1.28661416, FILETE2_R), (1.28661416, 0))
            Line((1.28661416, 0), (1.28661416 - FILETE2_R, 0))
        make_face()
    filete2_piece_23b = revolve(axis=Axis((8.86, 4.21844243, -2.14), (0, 0, 1)), revolution_arc=81.710254876, mode=Mode.PRIVATE)
    filete2_piece_23b = split(filete2_piece_23b, bisect_by=Plane(origin=(7.768663503, 4.985758514, -2.106780436), z_dir=(0, -1, 0)), keep=Keep.TOP, mode=Mode.PRIVATE)
    filete2_piece_23 = filete2_piece_23a & filete2_piece_23b
    add(filete2_piece_23, mode=Mode.SUBTRACT)
    with BuildSketch(Plane(origin=(8.86, 4.21844243, -2.14), x_dir=(0.940229636725142, 0.34054108448718423, 0), z_dir=(0.34054108448718423, -0.940229636725142, 0))) as filete2_piece_24a_section:
        with BuildLine():
            CenterArc((1.28661416 - FILETE2_R, FILETE2_R), FILETE2_R, 270, 90)
            Line((1.28661416, FILETE2_R), (1.28661416, 0))
            Line((1.28661416, 0), (1.28661416 - FILETE2_R, 0))
        make_face()
    filete2_piece_24a = revolve(axis=Axis((8.86, 4.21844243, -2.14), (0, 0, 1)), revolution_arc=81.710254876, mode=Mode.PRIVATE)
    filete2_piece_24a = split(filete2_piece_24a, bisect_by=Plane(origin=(9.951335845, 4.985758514, -2.106780541), z_dir=(0, -1, 0)), keep=Keep.TOP, mode=Mode.PRIVATE)
    with BuildSketch(Plane(origin=(11.375, 4.985758514, -2.14), x_dir=(0, -1, 0), z_dir=(-1, 0, 0))) as filete2_piece_24b_section:
        with BuildLine():
            CenterArc((FILETE2_R, FILETE2_R), FILETE2_R, 180, 90)
            Line((0, FILETE2_R), (0, 0))
            Line((0, 0), (FILETE2_R, 0))
        make_face()
    filete2_piece_24b = extrude(amount=1.857235736, mode=Mode.PRIVATE)
    filete2_piece_24b = filete2_piece_24b & Plane(origin=(8.86, 4.21844243, -2.107095537), x_dir=(0.8026992826896523, 0.5963839883577674, 0), z_dir=(0, 0, 1)) * Cylinder(1.28661416, 5, mode=Mode.PRIVATE)
    filete2_piece_24 = filete2_piece_24a & filete2_piece_24b
    add(filete2_piece_24, mode=Mode.SUBTRACT)
    with BuildSketch(Plane(origin=(8.86, -4.24107257, -1.79), x_dir=(-0.9459877087145345, -0.324202490676776, 0), z_dir=(-0.324202490676776, 0.9459877087145345, 0))) as filete2_piece_25a_section:
        with BuildLine():
            CenterArc((1.273247493 - FILETE2_R, -FILETE2_R), FILETE2_R, 0, 90)
            Line((1.273247493, -FILETE2_R), (1.273247493, 0))
            Line((1.273247493, 0), (1.273247493 - FILETE2_R, 0))
        make_face()
    filete2_piece_25a = revolve(axis=Axis((8.86, -4.24107257, -1.79), (0, 0, 1)), revolution_arc=79.358119844, mode=Mode.PRIVATE)
    filete2_piece_25a = split(filete2_piece_25a, bisect_by=Plane(origin=(7.770930707, -4.985758514, -1.823259416), z_dir=(0, 1, 0)), keep=Keep.TOP, mode=Mode.PRIVATE)
    with BuildSketch(Plane(origin=(8.202235736, -4.985758514, -1.79), x_dir=(0, 1, 0), z_dir=(-1, 0, 0))) as filete2_piece_25b_section:
        with BuildLine():
            CenterArc((FILETE2_R, FILETE2_R), FILETE2_R, 180, 90)
            Line((0, FILETE2_R), (0, 0))
            Line((0, 0), (FILETE2_R, 0))
        make_face()
    filete2_piece_25b = extrude(amount=1.857235736, mode=Mode.PRIVATE)
    filete2_piece_25b = filete2_piece_25b & Plane(origin=(8.86, -4.24107257, -1.822934762), x_dir=(0.8111260921200049, -0.5848713214734753, 0), z_dir=(0, 0, 1)) * Cylinder(1.273247493, 5, mode=Mode.PRIVATE)
    filete2_piece_25 = filete2_piece_25a & filete2_piece_25b
    add(filete2_piece_25, mode=Mode.SUBTRACT)
    with BuildSketch(Plane(origin=(8.86, -4.24107257, -1.79), x_dir=(-0.14393107441873307, -0.9895877150695988, 0), z_dir=(-0.9895877150695988, 0.14393107441873307, 0))) as filete2_piece_26a_section:
        with BuildLine():
            CenterArc((1.273247493 - FILETE2_R, -FILETE2_R), FILETE2_R, 0, 90)
            Line((1.273247493 - FILETE2_R, 0), (1.273247493, 0))
            Line((1.273247493, 0), (1.273247493, -FILETE2_R))
        make_face()
    filete2_piece_26a = revolve(axis=Axis((8.86, -4.24107257, -1.79), (0, 0, 1)), revolution_arc=79.358119844, mode=Mode.PRIVATE)
    filete2_piece_26a = split(filete2_piece_26a, bisect_by=Plane(origin=(9.949069162, -4.985758514, -1.82325941), z_dir=(0, 1, 0)), keep=Keep.TOP, mode=Mode.PRIVATE)
    with BuildSketch(Plane(origin=(11.375, -4.985758514, -1.79), x_dir=(0, 1, 0), z_dir=(-1, 0, 0))) as filete2_piece_26b_section:
        with BuildLine():
            CenterArc((FILETE2_R, FILETE2_R), FILETE2_R, 180, 90)
            Line((0, FILETE2_R), (0, 0))
            Line((0, 0), (FILETE2_R, 0))
        make_face()
    filete2_piece_26b = extrude(amount=1.857235736, mode=Mode.PRIVATE)
    filete2_piece_26b = filete2_piece_26b & Plane(origin=(8.86, -4.24107257, -1.822934762), x_dir=(0.8111260921200049, -0.5848713214734753, 0), z_dir=(0, 0, 1)) * Cylinder(1.273247493, 5, mode=Mode.PRIVATE)
    filete2_piece_26 = filete2_piece_26a & filete2_piece_26b
    add(filete2_piece_26, mode=Mode.SUBTRACT)
    with BuildSketch(Plane(origin=(11.375, -4.985758514, -2.14), x_dir=(0, 1, 0), z_dir=(-1, 0, 0))) as filete2_piece_27a_section:
        with BuildLine():
            CenterArc((FILETE2_R, -FILETE2_R), FILETE2_R, 90, 90)
            Line((0, -FILETE2_R), (0, 0))
            Line((0, 0), (FILETE2_R, 0))
        make_face()
    filete2_piece_27a = extrude(amount=1.857235736, mode=Mode.PRIVATE)
    filete2_piece_27a = filete2_piece_27a & Plane(origin=(8.86, -4.24107257, -2.107065238), x_dir=(0.8111260921200049, -0.5848713214734753, 0), z_dir=(0, 0, 1)) * Cylinder(1.273247493, 5, mode=Mode.PRIVATE)
    with BuildSketch(Plane(origin=(8.86, -4.24107257, -2.14), x_dir=(-0.14393107441877348, -0.9895877150695928, 0), z_dir=(-0.9895877150695928, 0.14393107441877348, 0))) as filete2_piece_27b_section:
        with BuildLine():
            CenterArc((1.273247493 - FILETE2_R, FILETE2_R), FILETE2_R, 270, 90)
            Line((1.273247493, FILETE2_R), (1.273247493, 0))
            Line((1.273247493, 0), (1.273247493 - FILETE2_R, 0))
        make_face()
    filete2_piece_27b = revolve(axis=Axis((8.86, -4.24107257, -2.14), (0, 0, 1)), revolution_arc=79.358119844, mode=Mode.PRIVATE)
    filete2_piece_27b = split(filete2_piece_27b, bisect_by=Plane(origin=(9.949069162, -4.985758514, -2.10674059), z_dir=(0, 1, 0)), keep=Keep.TOP, mode=Mode.PRIVATE)
    filete2_piece_27 = filete2_piece_27a & filete2_piece_27b
    add(filete2_piece_27, mode=Mode.SUBTRACT)
    with BuildSketch(Plane(origin=(8.86, -4.24107257, -2.14), x_dir=(-0.9459877087145341, -0.3242024906767768, 0), z_dir=(-0.3242024906767768, 0.9459877087145341, 0))) as filete2_piece_28a_section:
        with BuildLine():
            CenterArc((1.273247493 - FILETE2_R, FILETE2_R), FILETE2_R, 270, 90)
            Line((1.273247493, FILETE2_R), (1.273247493, 0))
            Line((1.273247493, 0), (1.273247493 - FILETE2_R, 0))
        make_face()
    filete2_piece_28a = revolve(axis=Axis((8.86, -4.24107257, -2.14), (0, 0, 1)), revolution_arc=79.358119844, mode=Mode.PRIVATE)
    filete2_piece_28a = split(filete2_piece_28a, bisect_by=Plane(origin=(7.770930707, -4.985758514, -2.106740584), z_dir=(0, 1, 0)), keep=Keep.TOP, mode=Mode.PRIVATE)
    with BuildSketch(Plane(origin=(8.202235736, -4.985758514, -2.14), x_dir=(0, 1, 0), z_dir=(-1, 0, 0))) as filete2_piece_28b_section:
        with BuildLine():
            CenterArc((FILETE2_R, -FILETE2_R), FILETE2_R, 90, 90)
            Line((0, -FILETE2_R), (0, 0))
            Line((0, 0), (FILETE2_R, 0))
        make_face()
    filete2_piece_28b = extrude(amount=1.857235736, mode=Mode.PRIVATE)
    filete2_piece_28b = filete2_piece_28b & Plane(origin=(8.86, -4.24107257, -2.107065238), x_dir=(0.8111260921200049, -0.5848713214734753, 0), z_dir=(0, 0, 1)) * Cylinder(1.273247493, 5, mode=Mode.PRIVATE)
    filete2_piece_28 = filete2_piece_28a & filete2_piece_28b
    add(filete2_piece_28, mode=Mode.SUBTRACT)


solid = part.part
